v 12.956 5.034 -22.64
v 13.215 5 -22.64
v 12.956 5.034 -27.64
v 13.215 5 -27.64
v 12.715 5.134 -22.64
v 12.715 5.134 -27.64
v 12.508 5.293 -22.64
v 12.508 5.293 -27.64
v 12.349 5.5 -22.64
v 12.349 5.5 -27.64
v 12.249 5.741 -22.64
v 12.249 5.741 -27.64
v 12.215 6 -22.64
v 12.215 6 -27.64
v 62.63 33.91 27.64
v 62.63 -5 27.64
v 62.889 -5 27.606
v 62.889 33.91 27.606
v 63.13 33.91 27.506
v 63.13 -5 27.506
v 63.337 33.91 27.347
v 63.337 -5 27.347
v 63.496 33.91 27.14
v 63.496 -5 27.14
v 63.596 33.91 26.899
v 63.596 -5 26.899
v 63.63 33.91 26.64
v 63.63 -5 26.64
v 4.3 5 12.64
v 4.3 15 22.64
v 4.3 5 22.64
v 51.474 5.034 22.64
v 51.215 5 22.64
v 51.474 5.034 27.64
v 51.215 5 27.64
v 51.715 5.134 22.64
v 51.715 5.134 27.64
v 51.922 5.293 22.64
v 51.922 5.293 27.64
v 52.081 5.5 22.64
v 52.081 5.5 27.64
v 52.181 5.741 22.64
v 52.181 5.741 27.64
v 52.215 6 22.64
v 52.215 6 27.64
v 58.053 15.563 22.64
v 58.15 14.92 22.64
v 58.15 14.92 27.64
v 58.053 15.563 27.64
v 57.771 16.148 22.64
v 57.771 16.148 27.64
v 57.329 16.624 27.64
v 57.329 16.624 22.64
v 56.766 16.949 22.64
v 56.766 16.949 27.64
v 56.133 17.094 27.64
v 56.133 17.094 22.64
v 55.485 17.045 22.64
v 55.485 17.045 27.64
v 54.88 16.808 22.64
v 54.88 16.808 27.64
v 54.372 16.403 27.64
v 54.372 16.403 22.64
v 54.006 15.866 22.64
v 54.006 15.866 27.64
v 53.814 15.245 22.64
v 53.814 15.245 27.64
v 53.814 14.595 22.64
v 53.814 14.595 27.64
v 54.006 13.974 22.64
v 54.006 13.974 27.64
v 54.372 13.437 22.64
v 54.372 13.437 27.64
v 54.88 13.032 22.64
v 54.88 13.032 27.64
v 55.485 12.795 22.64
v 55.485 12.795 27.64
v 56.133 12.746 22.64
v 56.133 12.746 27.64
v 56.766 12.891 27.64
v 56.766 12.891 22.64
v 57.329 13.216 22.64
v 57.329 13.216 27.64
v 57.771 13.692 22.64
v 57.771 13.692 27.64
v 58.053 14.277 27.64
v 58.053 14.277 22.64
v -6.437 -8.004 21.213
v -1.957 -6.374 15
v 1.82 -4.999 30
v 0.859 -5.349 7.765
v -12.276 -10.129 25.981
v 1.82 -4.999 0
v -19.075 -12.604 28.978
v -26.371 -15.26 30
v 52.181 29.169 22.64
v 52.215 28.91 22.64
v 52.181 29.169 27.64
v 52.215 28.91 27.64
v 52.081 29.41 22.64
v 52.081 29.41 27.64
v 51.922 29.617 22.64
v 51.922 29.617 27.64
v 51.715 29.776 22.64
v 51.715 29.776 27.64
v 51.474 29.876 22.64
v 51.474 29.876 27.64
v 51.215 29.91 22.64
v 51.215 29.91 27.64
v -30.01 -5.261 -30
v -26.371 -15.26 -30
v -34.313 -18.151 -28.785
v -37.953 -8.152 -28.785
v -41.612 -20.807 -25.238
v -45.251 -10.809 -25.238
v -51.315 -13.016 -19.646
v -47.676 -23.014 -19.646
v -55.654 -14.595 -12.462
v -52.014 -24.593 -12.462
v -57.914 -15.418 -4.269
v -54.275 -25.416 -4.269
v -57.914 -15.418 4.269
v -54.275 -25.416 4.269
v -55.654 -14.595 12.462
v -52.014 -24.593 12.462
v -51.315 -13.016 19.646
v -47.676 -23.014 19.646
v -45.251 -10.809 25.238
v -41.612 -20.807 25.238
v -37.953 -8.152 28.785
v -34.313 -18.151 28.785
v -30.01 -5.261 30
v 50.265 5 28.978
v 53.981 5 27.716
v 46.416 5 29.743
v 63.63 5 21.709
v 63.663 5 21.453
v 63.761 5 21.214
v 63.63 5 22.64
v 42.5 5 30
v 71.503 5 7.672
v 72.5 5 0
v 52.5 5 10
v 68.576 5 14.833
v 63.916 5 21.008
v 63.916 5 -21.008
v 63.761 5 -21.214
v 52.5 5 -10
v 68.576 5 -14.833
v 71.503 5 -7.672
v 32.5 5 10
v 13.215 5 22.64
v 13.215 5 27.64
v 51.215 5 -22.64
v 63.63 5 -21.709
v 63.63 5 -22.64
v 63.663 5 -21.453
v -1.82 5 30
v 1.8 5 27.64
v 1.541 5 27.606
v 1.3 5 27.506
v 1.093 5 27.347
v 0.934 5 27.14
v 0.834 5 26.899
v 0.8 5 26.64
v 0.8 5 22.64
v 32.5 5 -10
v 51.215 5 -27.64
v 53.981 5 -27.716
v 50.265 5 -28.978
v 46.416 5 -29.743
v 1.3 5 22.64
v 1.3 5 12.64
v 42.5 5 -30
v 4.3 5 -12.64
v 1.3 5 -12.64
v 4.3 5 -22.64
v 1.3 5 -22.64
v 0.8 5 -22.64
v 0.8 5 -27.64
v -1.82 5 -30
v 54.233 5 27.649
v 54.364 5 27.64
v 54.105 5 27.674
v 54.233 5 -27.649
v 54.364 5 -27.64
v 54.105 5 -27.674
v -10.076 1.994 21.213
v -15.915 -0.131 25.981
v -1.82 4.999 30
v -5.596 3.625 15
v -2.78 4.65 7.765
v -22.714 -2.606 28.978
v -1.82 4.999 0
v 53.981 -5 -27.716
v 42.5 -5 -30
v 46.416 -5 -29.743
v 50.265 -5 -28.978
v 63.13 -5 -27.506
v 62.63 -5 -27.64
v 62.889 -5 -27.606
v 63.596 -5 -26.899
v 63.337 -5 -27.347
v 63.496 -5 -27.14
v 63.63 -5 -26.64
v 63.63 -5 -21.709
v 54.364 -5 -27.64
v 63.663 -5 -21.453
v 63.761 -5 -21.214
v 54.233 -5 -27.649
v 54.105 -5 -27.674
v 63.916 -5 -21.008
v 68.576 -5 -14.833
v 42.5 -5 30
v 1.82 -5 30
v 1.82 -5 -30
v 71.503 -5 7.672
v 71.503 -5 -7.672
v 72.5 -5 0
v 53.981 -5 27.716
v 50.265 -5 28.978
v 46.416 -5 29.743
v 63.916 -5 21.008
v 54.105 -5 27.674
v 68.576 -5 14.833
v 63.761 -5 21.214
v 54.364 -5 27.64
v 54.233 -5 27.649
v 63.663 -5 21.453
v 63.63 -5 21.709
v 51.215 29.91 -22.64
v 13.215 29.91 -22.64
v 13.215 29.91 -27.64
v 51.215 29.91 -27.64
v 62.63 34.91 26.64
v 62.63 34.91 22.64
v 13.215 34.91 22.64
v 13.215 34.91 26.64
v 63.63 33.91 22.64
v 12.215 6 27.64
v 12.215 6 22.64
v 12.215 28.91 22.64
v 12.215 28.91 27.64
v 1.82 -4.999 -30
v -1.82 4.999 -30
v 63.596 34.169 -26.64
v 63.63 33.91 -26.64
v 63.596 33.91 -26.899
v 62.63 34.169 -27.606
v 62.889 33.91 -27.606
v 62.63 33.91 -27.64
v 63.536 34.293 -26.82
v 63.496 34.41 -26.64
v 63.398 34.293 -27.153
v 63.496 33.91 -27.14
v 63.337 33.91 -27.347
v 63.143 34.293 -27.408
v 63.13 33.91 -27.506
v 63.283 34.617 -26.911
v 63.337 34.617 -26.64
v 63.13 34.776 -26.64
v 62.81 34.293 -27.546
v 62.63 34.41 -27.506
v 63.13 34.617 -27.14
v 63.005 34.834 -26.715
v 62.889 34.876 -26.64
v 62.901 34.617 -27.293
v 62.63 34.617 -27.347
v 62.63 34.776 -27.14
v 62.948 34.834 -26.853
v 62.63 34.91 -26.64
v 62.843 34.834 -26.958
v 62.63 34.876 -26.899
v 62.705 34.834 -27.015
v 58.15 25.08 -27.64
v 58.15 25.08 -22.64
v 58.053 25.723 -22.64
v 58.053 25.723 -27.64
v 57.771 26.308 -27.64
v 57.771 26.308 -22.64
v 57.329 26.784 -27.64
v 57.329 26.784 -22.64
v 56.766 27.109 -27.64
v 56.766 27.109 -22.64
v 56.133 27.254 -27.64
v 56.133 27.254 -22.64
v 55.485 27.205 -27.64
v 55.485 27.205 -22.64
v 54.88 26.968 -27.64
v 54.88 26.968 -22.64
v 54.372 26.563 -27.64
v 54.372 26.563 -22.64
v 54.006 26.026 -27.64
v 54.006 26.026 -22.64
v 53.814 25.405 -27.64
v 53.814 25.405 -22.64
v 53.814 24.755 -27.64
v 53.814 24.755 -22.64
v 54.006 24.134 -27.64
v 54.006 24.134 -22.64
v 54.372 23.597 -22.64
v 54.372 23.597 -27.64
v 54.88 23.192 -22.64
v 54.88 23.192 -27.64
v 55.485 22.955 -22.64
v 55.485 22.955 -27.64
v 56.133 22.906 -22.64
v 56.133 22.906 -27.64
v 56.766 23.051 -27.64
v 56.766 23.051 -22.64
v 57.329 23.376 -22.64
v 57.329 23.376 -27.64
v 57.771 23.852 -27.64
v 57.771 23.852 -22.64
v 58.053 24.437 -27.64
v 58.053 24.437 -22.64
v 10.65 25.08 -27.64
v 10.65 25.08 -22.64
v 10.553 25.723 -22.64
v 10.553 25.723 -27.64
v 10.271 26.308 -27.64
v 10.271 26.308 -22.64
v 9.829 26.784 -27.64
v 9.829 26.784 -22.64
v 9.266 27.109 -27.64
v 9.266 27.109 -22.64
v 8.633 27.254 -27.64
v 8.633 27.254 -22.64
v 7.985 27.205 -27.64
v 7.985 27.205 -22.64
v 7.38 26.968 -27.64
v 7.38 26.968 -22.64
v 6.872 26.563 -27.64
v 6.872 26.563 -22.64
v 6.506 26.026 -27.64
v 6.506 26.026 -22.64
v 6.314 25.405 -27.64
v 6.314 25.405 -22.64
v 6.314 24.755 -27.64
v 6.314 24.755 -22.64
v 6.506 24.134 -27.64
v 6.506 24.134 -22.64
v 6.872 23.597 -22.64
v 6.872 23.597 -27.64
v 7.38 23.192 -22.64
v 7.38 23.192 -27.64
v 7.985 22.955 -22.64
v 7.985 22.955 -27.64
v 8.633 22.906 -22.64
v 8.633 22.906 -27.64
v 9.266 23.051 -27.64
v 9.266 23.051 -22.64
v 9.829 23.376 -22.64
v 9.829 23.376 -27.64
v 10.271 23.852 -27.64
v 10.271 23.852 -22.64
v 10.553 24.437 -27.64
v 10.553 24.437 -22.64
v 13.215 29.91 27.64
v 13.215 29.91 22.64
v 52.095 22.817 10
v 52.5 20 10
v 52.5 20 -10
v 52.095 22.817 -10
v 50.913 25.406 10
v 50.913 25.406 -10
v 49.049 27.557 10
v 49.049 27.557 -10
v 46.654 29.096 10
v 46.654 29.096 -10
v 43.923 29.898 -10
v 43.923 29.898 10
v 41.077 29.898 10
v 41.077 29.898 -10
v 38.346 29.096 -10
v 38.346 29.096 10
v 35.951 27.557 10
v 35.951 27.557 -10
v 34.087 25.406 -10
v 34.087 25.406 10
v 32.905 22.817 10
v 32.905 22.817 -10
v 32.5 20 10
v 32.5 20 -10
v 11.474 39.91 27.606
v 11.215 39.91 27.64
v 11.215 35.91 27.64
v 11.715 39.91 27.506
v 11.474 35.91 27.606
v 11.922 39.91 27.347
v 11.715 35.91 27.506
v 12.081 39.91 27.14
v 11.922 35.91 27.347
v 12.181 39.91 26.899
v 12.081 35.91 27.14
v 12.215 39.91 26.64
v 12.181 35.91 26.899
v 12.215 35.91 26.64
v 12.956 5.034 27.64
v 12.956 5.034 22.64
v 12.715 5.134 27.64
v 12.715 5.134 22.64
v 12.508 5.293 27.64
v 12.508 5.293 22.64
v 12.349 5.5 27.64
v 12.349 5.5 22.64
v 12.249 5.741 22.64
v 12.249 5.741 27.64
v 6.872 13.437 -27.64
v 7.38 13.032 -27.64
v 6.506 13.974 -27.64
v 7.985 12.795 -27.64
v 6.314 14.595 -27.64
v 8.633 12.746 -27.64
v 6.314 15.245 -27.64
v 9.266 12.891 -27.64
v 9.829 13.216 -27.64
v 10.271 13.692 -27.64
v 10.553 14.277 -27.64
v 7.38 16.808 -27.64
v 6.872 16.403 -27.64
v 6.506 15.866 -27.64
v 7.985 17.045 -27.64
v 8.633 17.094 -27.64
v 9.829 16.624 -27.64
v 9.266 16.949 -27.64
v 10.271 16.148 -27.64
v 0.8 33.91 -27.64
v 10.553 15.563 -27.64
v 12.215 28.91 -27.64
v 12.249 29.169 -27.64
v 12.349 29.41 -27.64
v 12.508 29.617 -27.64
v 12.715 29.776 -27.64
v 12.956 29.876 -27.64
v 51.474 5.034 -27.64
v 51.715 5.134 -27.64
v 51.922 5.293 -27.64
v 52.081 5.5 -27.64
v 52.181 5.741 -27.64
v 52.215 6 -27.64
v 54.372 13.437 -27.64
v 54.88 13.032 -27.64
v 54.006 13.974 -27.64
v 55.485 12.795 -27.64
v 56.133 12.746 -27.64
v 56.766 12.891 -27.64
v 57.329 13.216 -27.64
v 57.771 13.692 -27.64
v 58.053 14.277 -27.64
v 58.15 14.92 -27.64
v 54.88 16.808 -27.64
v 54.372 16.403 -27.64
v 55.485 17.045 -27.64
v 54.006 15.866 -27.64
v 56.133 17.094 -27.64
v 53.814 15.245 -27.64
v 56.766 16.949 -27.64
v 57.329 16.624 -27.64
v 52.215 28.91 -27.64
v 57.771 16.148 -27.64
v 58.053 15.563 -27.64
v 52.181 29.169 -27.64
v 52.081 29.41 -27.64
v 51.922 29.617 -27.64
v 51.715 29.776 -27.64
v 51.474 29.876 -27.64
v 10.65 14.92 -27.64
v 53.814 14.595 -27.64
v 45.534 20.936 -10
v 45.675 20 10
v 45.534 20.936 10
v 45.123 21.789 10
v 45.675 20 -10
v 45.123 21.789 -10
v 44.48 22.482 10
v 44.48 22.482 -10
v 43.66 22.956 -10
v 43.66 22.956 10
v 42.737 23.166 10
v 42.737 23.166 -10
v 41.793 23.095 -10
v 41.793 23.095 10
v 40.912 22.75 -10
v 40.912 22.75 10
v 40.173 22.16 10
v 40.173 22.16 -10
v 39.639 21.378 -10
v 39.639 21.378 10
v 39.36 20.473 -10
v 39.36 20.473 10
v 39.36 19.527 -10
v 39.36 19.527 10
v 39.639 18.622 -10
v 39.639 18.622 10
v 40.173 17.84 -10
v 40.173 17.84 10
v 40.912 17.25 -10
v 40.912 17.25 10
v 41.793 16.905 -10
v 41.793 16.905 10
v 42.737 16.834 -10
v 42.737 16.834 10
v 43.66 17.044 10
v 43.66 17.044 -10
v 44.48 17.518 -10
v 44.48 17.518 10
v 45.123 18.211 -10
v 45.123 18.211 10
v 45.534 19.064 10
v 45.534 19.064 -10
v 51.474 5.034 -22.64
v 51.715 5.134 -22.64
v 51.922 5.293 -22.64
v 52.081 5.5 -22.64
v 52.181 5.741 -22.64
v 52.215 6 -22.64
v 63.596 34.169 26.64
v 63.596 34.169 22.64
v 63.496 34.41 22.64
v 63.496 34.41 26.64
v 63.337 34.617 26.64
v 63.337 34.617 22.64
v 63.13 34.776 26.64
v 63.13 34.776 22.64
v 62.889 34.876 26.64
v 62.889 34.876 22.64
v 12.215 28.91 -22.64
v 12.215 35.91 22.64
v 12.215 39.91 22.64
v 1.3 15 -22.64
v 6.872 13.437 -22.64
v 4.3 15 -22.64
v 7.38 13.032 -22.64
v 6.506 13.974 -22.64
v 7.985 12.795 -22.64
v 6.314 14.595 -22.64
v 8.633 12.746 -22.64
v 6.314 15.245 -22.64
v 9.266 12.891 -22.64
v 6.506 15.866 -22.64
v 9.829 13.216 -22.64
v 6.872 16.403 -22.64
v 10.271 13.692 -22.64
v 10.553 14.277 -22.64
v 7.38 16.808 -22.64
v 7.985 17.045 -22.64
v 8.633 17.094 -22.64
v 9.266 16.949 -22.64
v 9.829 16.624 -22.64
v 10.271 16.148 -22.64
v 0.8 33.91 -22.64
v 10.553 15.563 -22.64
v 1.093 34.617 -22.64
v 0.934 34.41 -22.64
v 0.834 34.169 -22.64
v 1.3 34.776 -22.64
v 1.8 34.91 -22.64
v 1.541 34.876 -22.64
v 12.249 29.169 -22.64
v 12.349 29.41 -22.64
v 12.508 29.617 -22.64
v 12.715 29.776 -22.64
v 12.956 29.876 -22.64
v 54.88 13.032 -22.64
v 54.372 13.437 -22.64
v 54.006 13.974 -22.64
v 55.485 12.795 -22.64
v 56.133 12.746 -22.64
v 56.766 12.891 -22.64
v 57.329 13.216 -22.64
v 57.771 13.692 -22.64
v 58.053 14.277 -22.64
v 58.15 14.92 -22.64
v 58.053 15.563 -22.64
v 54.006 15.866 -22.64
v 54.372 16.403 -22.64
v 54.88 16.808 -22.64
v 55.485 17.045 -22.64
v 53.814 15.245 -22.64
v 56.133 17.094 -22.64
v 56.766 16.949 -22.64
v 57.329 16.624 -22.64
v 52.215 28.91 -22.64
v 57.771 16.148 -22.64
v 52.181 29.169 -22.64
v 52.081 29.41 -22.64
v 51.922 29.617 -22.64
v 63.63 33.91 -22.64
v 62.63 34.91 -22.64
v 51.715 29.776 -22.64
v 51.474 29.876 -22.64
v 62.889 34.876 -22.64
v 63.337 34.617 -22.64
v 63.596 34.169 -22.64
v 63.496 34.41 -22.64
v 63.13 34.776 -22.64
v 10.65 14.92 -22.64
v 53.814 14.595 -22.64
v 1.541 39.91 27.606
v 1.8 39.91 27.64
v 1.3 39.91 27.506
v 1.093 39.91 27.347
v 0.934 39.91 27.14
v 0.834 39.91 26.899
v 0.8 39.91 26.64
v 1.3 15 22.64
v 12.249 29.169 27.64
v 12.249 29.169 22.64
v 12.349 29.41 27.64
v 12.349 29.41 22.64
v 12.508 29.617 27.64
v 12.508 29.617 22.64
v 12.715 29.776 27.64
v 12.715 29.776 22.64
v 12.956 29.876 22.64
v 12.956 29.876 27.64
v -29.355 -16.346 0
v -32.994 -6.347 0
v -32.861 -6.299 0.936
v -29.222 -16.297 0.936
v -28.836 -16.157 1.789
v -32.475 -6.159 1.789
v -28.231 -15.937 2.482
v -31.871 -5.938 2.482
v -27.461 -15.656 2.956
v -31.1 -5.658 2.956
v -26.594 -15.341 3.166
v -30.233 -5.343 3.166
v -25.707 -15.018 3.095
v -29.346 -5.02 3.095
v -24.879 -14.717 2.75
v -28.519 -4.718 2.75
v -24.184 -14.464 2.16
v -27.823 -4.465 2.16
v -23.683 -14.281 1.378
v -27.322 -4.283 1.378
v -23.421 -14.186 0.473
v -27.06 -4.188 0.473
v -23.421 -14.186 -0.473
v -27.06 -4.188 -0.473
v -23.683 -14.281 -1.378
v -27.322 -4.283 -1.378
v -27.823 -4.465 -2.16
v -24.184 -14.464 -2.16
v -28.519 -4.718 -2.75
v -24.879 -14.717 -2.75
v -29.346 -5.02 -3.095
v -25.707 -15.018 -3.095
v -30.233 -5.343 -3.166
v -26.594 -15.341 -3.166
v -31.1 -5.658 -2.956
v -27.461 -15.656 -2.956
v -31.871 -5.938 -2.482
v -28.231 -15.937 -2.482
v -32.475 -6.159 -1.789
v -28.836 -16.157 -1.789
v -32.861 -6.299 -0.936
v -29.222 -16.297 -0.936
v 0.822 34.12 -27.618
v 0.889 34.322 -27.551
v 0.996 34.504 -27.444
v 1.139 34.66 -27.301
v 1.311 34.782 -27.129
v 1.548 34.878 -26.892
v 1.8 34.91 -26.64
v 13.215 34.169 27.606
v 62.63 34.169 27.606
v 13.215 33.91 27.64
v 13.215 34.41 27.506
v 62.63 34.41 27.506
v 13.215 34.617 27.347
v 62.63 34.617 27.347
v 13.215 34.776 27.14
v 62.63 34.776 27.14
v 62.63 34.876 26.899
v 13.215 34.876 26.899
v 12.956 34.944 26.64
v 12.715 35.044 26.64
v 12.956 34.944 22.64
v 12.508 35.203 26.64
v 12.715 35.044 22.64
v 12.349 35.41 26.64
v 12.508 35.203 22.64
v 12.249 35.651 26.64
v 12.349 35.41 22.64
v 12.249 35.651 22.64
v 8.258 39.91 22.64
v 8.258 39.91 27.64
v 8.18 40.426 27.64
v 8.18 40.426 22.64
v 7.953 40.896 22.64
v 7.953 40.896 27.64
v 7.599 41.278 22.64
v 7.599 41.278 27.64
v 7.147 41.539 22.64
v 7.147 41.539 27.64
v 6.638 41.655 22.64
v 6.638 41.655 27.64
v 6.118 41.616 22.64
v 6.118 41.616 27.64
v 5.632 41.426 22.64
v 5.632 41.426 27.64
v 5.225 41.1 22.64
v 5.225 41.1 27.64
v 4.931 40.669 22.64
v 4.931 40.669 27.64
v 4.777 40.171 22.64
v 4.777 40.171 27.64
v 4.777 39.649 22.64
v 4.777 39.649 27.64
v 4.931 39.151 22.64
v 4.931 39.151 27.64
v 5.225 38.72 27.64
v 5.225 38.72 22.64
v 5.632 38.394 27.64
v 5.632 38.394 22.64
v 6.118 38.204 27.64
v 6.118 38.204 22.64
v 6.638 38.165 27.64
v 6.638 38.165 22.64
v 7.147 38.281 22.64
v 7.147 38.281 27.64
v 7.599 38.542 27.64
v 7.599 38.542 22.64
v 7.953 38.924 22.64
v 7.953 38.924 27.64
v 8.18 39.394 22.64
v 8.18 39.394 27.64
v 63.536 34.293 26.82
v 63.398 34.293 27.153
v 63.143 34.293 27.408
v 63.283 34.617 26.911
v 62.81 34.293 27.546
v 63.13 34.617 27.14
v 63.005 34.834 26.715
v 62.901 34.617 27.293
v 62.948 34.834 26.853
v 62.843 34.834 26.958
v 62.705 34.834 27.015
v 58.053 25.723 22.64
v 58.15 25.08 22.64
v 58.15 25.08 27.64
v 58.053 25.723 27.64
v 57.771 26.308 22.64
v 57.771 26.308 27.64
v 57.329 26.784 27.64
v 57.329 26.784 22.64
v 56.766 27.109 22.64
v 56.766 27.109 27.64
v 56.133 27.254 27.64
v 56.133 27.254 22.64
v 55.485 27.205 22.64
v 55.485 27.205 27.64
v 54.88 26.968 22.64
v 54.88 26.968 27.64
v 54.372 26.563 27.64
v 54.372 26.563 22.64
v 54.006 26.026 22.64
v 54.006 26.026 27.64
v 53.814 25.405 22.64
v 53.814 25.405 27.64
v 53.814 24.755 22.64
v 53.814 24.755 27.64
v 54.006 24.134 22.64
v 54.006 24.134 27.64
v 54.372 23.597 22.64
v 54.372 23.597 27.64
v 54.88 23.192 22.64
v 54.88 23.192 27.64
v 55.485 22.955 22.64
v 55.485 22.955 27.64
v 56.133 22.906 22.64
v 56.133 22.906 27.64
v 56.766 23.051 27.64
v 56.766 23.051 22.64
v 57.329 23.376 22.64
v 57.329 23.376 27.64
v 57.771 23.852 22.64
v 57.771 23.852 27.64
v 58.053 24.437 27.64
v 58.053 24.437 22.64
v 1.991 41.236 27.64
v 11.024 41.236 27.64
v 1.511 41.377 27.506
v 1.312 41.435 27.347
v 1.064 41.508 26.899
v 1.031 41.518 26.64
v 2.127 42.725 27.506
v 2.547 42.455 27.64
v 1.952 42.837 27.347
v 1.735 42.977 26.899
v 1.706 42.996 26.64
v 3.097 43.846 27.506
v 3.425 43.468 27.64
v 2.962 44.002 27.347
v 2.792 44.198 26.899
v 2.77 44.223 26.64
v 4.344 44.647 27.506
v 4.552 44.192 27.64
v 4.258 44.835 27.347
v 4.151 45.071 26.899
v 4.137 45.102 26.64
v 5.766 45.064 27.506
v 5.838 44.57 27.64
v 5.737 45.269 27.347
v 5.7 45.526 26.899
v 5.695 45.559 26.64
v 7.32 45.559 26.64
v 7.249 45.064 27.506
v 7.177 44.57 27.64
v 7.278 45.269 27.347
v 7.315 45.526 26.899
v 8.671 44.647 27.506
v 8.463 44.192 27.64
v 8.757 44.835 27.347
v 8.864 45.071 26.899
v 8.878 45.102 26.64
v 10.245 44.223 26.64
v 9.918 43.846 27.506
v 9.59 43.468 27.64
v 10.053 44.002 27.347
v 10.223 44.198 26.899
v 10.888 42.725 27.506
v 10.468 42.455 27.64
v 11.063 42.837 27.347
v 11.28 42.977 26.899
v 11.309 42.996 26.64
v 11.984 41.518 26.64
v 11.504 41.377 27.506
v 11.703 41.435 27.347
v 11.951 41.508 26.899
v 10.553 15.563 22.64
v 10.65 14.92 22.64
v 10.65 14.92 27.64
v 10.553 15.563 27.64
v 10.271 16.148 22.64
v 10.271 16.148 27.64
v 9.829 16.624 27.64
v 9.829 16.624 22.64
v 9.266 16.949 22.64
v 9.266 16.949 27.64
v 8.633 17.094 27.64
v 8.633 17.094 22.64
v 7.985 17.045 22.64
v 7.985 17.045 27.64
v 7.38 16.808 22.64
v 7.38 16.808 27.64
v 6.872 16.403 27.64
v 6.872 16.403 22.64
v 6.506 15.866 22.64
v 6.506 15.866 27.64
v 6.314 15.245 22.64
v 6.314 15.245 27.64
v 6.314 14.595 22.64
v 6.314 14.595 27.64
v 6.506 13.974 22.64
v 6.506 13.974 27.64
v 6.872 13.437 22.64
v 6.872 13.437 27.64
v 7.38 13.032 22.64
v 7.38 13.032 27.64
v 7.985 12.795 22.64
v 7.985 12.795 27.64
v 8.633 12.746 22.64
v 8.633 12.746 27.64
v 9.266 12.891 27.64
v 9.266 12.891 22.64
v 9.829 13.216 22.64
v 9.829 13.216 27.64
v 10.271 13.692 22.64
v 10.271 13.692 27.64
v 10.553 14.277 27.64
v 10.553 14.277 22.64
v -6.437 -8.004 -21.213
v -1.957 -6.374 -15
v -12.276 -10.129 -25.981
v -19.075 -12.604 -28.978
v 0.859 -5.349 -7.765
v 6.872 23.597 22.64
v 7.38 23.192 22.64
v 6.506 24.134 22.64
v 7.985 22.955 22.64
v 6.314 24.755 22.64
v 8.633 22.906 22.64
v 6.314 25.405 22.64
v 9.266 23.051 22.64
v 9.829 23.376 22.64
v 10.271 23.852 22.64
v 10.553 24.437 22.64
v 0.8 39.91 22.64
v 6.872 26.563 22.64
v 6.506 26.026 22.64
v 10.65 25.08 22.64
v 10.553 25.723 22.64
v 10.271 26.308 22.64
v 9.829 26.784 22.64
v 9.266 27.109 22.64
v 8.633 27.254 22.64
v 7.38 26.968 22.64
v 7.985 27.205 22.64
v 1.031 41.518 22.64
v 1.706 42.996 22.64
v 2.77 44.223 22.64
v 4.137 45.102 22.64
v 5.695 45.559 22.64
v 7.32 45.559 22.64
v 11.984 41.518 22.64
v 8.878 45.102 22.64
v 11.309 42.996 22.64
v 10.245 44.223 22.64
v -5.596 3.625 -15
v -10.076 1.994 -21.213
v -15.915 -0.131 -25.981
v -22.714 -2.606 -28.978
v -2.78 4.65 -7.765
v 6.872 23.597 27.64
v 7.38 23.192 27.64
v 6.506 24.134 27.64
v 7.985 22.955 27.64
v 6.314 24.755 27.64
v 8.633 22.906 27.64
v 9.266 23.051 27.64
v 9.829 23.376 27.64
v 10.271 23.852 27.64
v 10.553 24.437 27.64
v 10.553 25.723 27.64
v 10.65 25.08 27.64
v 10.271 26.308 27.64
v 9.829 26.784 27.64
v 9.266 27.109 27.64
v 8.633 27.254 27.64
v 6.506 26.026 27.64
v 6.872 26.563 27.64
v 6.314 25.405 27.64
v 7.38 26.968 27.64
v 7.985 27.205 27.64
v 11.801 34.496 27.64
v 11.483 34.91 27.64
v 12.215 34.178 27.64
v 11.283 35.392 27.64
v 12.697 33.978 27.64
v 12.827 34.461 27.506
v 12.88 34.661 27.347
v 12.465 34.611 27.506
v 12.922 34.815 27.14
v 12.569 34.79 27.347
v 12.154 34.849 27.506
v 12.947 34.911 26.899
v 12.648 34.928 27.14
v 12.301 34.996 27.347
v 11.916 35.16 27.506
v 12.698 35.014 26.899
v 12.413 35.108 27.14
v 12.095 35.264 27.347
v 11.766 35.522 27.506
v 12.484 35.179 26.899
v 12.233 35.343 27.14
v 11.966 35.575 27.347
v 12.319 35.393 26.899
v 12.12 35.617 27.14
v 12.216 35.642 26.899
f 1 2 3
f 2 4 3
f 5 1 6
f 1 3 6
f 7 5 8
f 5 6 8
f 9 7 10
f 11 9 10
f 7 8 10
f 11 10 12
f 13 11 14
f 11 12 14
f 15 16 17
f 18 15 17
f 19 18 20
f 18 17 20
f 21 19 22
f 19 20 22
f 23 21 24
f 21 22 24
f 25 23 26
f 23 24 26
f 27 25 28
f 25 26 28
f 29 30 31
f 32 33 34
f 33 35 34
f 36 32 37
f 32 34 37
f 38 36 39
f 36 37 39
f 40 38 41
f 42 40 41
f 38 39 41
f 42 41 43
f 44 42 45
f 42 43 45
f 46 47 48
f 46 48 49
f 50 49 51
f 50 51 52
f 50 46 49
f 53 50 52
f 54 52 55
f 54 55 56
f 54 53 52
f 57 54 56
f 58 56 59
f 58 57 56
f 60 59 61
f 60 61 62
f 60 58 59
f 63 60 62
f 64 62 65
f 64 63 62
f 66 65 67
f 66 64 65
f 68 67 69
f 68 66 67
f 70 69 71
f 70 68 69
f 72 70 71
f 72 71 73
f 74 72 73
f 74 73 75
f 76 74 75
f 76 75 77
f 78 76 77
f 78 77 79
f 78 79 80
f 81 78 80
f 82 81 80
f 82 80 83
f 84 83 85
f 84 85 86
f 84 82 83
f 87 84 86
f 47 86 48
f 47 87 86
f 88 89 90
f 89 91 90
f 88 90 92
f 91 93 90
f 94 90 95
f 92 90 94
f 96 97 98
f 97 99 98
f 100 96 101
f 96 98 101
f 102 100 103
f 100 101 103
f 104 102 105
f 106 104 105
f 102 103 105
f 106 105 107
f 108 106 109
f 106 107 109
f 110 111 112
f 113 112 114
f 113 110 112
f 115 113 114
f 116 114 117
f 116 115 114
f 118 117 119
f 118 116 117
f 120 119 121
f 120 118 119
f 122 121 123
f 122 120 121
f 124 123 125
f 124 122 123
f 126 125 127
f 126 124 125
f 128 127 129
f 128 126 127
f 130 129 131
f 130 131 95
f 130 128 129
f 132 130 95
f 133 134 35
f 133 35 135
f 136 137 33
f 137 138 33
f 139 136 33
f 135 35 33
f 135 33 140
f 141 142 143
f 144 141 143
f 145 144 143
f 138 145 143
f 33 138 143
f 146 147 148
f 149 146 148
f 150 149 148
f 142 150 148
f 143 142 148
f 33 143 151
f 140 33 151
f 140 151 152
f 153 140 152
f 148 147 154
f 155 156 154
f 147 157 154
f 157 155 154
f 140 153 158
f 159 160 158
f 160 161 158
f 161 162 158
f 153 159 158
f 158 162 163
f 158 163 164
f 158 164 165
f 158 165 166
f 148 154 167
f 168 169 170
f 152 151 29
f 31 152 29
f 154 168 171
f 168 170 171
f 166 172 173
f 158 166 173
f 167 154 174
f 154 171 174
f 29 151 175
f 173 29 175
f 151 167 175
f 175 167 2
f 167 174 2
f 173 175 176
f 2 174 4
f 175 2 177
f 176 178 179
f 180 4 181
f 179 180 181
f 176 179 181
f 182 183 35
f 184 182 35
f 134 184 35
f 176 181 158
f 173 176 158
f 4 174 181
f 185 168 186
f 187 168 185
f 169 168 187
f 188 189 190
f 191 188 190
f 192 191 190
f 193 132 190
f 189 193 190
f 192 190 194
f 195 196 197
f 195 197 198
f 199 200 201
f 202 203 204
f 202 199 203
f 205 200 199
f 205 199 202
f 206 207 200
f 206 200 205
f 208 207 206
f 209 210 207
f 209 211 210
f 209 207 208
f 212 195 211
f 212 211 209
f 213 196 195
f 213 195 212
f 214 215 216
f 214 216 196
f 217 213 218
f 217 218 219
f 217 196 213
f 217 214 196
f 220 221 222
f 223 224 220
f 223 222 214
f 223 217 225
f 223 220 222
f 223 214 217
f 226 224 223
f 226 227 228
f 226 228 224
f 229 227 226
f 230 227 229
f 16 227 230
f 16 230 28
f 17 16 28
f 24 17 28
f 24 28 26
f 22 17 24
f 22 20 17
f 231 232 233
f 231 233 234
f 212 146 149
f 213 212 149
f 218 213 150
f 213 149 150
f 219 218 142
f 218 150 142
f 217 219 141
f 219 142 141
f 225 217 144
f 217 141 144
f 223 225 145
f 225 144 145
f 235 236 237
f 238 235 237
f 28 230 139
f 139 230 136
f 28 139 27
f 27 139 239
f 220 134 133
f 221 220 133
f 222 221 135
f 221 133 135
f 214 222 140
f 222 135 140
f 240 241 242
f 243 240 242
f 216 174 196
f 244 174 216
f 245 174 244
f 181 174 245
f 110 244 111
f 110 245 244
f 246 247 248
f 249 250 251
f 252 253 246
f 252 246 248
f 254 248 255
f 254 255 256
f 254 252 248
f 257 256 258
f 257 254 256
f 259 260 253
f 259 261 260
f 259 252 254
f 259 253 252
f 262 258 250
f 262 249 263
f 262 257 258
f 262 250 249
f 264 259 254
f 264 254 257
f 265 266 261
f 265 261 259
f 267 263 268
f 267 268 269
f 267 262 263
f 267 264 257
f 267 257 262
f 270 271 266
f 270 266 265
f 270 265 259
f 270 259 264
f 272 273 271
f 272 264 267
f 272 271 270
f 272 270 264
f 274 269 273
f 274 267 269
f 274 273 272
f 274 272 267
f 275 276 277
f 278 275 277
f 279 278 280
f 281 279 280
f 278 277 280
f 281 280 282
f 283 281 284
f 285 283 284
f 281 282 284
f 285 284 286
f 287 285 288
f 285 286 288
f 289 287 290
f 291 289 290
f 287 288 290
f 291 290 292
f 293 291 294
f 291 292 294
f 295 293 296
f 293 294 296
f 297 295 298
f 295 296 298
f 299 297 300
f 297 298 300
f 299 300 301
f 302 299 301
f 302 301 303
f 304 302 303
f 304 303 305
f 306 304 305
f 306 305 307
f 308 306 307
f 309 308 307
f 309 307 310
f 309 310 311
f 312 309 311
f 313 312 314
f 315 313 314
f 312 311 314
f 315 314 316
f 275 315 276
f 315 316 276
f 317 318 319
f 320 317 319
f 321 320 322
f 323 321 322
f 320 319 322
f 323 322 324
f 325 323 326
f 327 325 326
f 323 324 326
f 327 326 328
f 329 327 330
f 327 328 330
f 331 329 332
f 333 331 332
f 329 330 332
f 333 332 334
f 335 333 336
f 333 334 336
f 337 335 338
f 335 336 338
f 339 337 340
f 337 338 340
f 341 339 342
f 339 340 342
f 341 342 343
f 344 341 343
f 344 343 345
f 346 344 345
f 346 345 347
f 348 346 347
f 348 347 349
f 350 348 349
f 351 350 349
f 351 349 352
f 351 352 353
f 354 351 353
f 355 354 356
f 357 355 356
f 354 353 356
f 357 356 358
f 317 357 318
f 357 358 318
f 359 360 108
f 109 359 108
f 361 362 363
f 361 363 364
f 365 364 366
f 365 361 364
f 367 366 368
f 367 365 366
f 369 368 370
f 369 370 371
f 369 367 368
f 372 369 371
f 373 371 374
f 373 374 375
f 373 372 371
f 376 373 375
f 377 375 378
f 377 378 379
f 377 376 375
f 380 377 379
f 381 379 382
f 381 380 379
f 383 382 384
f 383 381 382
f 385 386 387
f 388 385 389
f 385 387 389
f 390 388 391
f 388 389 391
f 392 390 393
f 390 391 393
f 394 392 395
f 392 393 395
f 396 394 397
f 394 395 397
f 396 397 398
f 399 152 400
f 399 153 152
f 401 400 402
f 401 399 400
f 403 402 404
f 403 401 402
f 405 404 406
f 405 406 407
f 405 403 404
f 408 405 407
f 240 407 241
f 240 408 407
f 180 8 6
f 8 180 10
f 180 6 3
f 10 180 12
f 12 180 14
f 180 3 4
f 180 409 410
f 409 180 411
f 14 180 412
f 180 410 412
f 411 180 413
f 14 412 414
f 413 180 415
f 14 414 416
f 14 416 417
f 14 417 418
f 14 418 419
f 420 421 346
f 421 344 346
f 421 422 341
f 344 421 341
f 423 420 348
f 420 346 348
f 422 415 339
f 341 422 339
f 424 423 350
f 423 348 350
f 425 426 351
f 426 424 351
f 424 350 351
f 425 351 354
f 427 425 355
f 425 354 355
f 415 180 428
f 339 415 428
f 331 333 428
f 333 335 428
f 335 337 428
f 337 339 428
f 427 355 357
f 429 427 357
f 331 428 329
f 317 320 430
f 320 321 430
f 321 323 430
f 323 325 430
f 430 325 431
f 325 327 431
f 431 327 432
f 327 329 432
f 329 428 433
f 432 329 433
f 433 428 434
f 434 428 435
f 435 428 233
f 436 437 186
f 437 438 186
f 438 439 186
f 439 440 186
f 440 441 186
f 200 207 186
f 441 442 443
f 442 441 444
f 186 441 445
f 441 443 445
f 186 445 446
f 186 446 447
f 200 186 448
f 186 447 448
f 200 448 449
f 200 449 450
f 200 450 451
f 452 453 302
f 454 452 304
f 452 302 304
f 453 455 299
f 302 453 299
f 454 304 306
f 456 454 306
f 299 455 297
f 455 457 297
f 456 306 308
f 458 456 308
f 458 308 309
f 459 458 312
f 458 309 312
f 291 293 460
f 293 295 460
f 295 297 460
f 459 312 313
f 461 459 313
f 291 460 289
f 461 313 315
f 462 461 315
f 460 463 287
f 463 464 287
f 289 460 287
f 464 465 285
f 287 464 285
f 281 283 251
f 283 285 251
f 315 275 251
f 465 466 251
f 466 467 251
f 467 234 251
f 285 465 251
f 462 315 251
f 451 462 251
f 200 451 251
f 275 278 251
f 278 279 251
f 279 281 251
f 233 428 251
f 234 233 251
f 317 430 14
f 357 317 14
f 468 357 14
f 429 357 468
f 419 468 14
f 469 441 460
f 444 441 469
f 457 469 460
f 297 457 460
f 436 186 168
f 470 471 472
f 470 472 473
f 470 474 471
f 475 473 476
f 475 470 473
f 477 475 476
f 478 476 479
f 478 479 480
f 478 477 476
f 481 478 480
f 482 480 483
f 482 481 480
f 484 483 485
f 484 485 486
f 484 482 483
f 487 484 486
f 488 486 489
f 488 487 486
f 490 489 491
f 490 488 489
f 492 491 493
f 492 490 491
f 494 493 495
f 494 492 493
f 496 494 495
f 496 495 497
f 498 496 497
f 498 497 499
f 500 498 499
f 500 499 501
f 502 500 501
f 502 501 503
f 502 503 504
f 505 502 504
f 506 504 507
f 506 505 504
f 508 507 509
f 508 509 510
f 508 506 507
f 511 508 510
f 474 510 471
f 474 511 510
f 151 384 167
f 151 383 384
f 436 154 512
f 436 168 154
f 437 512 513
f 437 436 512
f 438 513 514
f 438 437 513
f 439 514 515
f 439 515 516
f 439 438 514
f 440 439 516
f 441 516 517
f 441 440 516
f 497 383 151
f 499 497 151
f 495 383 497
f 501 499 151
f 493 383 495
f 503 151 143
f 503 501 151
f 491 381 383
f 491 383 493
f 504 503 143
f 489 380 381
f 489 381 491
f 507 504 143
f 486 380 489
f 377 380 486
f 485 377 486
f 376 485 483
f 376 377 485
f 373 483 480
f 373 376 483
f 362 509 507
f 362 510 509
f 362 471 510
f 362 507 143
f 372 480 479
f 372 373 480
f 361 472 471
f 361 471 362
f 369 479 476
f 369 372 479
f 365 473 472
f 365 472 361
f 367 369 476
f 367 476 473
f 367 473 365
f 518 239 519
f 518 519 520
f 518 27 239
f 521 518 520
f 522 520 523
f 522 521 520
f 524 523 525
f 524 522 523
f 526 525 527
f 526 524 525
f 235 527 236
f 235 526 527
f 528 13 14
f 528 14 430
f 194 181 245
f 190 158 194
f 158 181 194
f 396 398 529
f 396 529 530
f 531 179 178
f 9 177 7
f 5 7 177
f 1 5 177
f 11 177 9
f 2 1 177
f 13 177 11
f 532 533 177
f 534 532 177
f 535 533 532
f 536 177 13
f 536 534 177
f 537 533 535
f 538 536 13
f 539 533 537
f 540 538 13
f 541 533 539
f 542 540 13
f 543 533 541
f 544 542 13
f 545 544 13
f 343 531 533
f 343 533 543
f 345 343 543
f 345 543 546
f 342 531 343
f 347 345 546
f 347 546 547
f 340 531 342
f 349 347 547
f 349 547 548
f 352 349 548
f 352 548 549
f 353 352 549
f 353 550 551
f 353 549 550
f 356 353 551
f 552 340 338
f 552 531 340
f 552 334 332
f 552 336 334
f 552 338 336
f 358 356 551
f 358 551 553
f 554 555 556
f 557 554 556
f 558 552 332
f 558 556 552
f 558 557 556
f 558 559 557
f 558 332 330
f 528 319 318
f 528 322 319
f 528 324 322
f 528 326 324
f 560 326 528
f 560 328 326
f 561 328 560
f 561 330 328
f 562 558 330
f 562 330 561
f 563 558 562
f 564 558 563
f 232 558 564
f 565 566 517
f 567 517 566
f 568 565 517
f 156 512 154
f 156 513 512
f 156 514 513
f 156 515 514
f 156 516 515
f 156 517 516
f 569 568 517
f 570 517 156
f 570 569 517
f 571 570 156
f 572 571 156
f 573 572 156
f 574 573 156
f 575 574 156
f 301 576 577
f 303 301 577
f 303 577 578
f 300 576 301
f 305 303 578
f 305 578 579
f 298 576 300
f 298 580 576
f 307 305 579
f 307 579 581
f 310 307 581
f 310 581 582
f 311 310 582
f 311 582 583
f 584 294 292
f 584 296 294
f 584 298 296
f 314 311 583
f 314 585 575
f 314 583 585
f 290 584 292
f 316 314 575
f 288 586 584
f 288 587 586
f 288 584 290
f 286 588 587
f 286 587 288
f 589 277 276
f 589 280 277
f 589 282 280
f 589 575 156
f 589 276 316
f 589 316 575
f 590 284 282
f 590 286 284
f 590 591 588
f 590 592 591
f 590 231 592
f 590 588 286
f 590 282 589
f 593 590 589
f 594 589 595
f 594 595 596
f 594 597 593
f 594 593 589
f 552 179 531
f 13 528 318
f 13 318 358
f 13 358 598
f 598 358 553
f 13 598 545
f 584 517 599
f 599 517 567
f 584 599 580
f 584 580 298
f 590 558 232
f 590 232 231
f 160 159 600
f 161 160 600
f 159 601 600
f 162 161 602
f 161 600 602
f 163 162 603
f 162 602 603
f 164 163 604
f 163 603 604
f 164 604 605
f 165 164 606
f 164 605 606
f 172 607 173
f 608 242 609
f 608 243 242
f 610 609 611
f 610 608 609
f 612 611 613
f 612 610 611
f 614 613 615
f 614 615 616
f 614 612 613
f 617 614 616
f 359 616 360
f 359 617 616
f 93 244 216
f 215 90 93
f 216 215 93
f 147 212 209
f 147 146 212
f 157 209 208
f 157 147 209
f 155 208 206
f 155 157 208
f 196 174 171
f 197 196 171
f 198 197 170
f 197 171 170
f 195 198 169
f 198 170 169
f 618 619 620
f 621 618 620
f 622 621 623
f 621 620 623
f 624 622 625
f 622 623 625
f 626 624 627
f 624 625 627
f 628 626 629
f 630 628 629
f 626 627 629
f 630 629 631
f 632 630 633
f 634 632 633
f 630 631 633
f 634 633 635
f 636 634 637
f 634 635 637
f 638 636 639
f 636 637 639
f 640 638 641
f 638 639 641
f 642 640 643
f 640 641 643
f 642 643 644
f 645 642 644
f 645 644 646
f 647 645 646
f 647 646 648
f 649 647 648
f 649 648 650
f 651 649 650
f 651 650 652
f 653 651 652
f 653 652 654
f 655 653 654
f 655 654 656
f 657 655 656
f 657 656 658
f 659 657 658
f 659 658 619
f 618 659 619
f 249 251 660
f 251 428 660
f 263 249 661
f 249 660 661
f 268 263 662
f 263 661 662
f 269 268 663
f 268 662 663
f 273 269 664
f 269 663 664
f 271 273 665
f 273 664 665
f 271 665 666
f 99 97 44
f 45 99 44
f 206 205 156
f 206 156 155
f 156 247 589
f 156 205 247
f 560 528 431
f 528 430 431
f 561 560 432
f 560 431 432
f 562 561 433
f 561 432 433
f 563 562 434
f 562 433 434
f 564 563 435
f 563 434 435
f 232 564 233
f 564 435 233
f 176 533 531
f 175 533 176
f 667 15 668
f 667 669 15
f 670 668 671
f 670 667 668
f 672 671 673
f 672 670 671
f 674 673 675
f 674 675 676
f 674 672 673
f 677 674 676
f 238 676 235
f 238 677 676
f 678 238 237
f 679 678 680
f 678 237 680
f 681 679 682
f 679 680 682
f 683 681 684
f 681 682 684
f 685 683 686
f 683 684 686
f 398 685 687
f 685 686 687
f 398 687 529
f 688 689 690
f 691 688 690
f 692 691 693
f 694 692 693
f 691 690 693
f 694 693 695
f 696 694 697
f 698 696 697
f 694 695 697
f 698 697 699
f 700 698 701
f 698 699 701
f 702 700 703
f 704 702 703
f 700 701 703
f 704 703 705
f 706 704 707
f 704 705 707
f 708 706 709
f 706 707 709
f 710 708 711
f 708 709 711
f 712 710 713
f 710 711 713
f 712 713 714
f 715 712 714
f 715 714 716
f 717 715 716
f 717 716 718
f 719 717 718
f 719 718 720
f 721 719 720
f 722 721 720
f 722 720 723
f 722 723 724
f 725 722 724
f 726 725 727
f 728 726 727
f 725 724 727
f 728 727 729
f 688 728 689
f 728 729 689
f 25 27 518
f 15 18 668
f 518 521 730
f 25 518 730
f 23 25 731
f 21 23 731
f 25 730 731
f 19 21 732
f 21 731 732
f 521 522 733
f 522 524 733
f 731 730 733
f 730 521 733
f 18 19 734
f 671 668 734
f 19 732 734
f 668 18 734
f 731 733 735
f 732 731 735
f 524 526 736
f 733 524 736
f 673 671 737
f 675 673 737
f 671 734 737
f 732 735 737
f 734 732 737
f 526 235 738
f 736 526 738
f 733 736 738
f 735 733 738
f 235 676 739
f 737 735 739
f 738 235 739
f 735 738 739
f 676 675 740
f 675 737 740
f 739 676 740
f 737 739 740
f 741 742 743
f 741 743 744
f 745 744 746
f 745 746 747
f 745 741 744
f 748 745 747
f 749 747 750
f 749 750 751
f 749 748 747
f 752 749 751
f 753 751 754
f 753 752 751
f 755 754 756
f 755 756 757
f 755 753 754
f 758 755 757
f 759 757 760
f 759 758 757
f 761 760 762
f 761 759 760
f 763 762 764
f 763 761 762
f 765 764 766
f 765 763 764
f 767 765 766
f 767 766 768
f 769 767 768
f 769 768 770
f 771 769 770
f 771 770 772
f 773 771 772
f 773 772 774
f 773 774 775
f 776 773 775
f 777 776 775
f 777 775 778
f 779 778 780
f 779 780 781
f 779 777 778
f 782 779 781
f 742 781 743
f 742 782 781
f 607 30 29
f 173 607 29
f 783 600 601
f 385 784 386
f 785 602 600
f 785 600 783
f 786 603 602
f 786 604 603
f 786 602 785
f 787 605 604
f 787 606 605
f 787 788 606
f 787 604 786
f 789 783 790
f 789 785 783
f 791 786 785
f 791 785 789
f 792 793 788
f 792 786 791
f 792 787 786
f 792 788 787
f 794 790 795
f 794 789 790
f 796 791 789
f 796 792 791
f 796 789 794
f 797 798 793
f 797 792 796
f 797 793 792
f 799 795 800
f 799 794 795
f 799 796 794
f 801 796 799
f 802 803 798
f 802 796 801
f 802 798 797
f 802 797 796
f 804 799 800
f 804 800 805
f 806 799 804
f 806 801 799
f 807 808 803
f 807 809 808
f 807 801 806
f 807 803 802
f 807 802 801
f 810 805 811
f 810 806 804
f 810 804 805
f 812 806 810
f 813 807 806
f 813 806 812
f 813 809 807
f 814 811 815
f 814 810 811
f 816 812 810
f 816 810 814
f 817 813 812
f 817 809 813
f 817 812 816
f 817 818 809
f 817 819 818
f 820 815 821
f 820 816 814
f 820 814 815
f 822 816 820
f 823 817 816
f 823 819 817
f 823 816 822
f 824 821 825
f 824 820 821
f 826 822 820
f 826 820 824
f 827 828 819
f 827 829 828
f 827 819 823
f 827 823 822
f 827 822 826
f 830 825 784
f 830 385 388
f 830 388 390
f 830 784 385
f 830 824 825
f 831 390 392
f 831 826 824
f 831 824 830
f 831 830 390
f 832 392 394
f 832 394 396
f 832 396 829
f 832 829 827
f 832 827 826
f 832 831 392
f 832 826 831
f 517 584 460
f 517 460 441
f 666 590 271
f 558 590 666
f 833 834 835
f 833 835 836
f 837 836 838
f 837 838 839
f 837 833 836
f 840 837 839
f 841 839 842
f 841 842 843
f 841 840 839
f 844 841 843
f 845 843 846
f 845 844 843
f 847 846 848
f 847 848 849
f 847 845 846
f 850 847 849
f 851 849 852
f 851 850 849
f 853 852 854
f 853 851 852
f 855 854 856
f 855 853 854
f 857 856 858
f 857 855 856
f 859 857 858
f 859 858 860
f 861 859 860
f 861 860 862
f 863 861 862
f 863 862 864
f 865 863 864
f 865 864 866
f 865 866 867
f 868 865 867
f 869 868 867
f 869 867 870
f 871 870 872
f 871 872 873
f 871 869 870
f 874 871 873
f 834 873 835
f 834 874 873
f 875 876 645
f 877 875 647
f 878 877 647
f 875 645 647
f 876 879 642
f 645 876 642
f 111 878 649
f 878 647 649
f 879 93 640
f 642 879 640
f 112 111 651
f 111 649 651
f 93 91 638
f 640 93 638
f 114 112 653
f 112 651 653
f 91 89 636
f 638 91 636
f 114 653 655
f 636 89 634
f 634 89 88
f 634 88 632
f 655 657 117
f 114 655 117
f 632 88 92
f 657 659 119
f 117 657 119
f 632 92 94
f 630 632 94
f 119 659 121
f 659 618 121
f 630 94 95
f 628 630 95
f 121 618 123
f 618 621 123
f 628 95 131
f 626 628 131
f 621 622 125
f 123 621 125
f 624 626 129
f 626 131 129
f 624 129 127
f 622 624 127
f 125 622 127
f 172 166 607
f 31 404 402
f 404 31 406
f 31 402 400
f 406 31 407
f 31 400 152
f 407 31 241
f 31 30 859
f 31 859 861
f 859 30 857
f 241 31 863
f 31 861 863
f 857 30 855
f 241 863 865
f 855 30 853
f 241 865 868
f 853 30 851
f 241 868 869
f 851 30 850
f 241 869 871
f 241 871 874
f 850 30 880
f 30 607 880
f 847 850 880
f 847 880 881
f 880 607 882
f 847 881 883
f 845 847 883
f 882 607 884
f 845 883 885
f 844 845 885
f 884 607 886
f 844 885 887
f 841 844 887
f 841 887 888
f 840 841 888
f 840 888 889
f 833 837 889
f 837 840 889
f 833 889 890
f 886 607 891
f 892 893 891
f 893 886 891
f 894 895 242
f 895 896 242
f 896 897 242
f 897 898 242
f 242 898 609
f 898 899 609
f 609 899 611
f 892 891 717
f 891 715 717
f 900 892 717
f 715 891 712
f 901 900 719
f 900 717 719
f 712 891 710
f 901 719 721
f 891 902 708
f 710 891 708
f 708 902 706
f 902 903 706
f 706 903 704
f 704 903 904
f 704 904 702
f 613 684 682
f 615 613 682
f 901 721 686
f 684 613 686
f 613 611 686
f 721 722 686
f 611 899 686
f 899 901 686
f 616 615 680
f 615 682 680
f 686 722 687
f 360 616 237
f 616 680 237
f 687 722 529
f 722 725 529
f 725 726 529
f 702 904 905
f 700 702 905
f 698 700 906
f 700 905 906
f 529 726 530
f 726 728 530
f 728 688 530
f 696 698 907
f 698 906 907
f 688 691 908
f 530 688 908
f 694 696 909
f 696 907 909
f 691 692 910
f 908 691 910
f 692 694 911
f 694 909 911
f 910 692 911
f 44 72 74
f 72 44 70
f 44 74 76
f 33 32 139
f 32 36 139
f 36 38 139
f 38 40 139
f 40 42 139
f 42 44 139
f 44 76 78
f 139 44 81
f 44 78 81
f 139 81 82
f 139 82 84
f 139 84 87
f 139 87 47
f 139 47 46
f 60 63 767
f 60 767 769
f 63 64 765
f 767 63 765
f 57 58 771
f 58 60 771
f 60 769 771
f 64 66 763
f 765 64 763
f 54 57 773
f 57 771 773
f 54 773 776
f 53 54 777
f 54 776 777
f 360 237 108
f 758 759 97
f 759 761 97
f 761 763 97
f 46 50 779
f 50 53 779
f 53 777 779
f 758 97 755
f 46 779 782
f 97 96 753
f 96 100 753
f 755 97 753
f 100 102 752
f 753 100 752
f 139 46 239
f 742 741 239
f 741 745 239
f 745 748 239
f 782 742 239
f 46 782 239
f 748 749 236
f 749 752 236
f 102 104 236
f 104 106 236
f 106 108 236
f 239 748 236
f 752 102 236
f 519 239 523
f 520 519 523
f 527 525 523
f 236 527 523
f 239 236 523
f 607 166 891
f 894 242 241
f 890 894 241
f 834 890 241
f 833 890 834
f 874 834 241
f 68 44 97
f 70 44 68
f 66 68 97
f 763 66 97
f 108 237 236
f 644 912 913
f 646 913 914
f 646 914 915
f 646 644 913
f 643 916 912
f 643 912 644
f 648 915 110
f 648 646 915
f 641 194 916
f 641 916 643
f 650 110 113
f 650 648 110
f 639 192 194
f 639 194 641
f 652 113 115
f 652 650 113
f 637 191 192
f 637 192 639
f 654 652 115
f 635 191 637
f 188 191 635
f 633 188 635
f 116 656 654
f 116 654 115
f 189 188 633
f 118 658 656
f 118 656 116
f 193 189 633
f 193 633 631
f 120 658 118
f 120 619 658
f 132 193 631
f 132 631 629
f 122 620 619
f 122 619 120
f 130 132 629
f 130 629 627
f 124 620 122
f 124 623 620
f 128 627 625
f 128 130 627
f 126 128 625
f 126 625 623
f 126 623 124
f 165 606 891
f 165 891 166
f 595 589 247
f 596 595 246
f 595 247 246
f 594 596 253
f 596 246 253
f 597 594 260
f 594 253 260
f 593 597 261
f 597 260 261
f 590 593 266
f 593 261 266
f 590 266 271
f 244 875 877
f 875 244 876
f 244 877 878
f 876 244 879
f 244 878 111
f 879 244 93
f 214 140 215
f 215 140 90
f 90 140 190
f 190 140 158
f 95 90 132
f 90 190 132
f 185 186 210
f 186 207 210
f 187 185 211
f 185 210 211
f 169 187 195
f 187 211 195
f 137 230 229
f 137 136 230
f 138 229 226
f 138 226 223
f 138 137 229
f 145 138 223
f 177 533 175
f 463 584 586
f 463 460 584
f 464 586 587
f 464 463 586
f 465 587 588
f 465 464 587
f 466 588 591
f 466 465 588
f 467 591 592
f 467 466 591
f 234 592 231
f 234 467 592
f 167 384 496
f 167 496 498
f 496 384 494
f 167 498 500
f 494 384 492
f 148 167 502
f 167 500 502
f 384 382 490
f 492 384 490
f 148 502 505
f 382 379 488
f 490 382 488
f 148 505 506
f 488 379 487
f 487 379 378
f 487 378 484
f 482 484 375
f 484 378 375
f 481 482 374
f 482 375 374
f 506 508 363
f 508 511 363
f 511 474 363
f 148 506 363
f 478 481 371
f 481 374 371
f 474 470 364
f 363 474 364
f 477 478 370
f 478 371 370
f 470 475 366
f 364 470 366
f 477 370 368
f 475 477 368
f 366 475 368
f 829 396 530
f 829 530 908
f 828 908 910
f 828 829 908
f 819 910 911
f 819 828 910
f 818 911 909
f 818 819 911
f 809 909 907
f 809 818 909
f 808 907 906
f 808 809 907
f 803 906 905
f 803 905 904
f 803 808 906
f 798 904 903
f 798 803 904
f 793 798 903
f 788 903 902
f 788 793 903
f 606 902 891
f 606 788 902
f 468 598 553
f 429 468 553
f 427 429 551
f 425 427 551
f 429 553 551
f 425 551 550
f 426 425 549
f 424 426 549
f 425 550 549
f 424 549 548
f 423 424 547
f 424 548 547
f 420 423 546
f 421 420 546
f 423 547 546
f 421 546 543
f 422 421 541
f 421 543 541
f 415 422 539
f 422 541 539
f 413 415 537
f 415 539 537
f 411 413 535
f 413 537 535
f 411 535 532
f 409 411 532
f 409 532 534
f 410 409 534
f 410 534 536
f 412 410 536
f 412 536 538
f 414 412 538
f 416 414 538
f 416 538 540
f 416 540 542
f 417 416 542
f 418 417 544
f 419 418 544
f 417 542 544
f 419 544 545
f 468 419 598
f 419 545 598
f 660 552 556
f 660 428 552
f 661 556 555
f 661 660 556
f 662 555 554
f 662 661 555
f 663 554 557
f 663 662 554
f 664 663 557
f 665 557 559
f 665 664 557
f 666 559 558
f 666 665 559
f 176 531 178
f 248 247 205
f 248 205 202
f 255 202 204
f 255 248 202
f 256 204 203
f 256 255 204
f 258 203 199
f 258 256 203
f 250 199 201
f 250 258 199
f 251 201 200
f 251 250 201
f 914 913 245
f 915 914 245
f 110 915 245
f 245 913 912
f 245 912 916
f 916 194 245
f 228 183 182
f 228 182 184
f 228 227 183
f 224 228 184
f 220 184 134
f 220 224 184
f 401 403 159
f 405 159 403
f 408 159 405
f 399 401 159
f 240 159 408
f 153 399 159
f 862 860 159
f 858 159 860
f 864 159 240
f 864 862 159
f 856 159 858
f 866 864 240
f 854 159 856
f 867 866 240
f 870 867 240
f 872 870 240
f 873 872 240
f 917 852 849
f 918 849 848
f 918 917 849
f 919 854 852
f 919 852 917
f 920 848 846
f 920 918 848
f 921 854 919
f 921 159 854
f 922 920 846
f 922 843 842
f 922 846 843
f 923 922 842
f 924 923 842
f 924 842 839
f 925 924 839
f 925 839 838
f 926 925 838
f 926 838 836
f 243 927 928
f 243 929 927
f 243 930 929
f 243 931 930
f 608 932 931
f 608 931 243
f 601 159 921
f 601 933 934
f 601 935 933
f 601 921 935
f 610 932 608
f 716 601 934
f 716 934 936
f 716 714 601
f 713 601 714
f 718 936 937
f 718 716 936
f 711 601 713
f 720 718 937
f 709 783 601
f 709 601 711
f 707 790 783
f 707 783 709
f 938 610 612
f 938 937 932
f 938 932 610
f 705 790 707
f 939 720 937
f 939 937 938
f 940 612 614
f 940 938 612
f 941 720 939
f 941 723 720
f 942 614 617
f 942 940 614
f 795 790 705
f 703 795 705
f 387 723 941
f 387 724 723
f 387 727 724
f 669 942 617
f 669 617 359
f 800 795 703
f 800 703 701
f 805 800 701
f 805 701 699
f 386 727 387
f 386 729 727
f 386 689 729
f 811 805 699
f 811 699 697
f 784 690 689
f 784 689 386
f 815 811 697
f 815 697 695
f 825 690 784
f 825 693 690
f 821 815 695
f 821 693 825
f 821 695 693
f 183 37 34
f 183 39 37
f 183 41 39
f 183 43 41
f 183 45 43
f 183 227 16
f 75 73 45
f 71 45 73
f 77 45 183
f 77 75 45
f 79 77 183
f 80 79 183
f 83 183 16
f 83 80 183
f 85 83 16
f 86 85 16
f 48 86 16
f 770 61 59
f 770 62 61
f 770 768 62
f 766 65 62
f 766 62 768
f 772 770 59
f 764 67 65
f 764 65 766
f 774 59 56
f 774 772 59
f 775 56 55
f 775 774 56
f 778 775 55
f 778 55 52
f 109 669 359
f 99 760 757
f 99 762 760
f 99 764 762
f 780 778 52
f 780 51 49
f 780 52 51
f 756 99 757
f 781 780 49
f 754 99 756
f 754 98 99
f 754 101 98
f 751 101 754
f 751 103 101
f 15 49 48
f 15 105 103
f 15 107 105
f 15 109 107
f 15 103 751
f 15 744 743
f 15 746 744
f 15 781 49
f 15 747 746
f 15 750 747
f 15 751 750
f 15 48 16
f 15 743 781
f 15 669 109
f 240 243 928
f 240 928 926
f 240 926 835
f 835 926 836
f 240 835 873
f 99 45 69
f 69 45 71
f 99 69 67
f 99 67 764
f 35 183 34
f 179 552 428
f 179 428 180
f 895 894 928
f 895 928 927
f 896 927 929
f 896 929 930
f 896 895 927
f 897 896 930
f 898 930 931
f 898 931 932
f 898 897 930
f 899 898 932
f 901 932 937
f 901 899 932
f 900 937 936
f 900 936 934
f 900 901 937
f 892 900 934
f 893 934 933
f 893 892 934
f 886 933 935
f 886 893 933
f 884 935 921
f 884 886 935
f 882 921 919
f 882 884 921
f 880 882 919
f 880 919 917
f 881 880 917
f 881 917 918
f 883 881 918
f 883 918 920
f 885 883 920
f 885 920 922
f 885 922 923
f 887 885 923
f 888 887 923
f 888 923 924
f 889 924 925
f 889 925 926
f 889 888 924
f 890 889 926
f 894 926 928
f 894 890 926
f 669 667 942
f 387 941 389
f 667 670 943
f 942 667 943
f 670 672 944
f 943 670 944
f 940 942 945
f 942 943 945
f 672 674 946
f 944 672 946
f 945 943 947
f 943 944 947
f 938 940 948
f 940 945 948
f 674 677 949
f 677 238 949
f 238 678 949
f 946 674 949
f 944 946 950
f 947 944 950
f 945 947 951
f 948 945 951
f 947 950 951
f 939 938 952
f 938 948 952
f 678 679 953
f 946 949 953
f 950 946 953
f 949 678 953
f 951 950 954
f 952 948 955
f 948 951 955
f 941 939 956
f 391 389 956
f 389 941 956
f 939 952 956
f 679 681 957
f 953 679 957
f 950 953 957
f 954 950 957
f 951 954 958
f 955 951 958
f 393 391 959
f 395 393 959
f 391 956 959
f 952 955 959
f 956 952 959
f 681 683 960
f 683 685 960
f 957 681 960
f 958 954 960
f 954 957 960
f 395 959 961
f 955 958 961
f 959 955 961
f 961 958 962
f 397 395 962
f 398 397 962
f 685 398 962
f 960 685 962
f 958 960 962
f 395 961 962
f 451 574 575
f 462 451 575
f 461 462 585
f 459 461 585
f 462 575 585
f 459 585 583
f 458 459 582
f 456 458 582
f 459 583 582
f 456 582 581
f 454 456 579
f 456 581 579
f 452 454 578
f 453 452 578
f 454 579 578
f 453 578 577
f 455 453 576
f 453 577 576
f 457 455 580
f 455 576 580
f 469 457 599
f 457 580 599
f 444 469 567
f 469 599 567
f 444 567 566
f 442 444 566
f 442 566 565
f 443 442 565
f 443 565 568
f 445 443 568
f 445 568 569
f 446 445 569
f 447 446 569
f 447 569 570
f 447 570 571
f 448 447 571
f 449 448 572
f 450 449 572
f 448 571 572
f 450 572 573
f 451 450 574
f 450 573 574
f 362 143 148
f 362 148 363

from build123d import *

# Parameters (mm, degrees)
BOSS_EXTRU_3_DEPTH      = 5
ESQUISSE7_R             = 3.175
BOSS_EXTRU_5_DEPTH      = 10
ESQUISSE13_R            = 2.18
BOSS_EXTRU_8_DEPTH      = 5
ESQUISSE33_W            = 9.466792894
ESQUISSE33_H            = 55.28
BOSS_EXTRU_10_DEPTH     = 10
ENL_V_MAT_EXTRU_6_DEPTH = 65
ESQUISSE35_R            = 30
BOSS_EXTRU_11_DEPTH     = 5.32
BOSS_EXTRU_12_DEPTH     = 30
ESQUISSE41_R            = 3.175
ENL_V_MAT_EXTRU_7_DEPTH = 60
ESQUISSE42_R            = 1.75
BOSS_EXTRU_13_DEPTH     = 5
NERVURE4_REACH          = 90.538
ESQUISSE45_WALL_W       = 193.218913386
ESQUISSE45_WALL_H       = 3
CONG_1_R                = 1
CONG_2_R                = 1


with BuildPart() as part:
    # Esquisse5 → Boss.-Extru.3 (new, symmetric)
    with BuildSketch(Plane(origin=(0, 0, 0), x_dir=(1, 0, 0), z_dir=(0, 1, 0))):
        with BuildLine():
            Line((42.5, -30), (-42.5, -30))
            ThreePointArc((-42.5, -30), (-72.5, 0), (-42.5, 30))
            Line((-42.5, 30), (42.5, 30))
            ThreePointArc((42.5, 30), (72.5, 0), (42.5, -30))
        make_face()
    extrude(amount=BOSS_EXTRU_3_DEPTH, both=True)

    # Esquisse7 → Boss.-Extru.5 (add, symmetric)
    with BuildSketch(Plane.XY):
        with BuildLine():
            Line((32.5, 5), (52.5, 5))
            Line((52.5, 5), (52.5, 20))
            ThreePointArc((52.5, 20), (42.5, 30), (32.5, 20))
            Line((32.5, 20), (32.5, 5))
        make_face()
        with Locations((42.5, 20)):
            Circle(ESQUISSE7_R, mode=Mode.SUBTRACT)
    extrude(amount=BOSS_EXTRU_5_DEPTH, both=True)

    # Esquisse13 → Boss.-Extru.8 (add)
    with BuildSketch(Plane.XY.offset(22.64)):
        Polygon((0.8, 5), (5.8, 5), (12.215, 5), (12.215, 29.91), (52.215, 29.91), (52.215, 5), (58.63, 5), (63.63, 5), (63.63, 34.91), (0.8, 34.91), align=None)
        with Locations((8.47, 14.92)):
            Circle(ESQUISSE13_R, mode=Mode.SUBTRACT)
        with Locations((55.97, 14.92)):
            Circle(ESQUISSE13_R, mode=Mode.SUBTRACT)
        with Locations((8.47, 25.08)):
            Circle(ESQUISSE13_R, mode=Mode.SUBTRACT)
        with Locations((55.97, 25.08)):
            Circle(ESQUISSE13_R, mode=Mode.SUBTRACT)
    boss_extru_8 = extrude(amount=BOSS_EXTRU_8_DEPTH)

    # Symétrie2: Boss.-Extru.8 across plane
    add(boss_extru_8.mirror(Plane.XY))

    # Esquisse33 → Boss.-Extru.10 (add)
    with BuildSketch(Plane.XZ.offset(-5)):
        with Locations((58.896603553, 0)):
            Rectangle(ESQUISSE33_W, ESQUISSE33_H)
    extrude(amount=BOSS_EXTRU_10_DEPTH)

    # Esquisse36 → Enlèv. mat.-Extru.6 (cut, symmetric)
    with BuildSketch(Plane.XY):
        Polygon((0, 0), (9.099255857, -25), (-112.5, -25), (-112.5, 35), (-12.738958199, 35), align=None)
    extrude(amount=ENL_V_MAT_EXTRU_6_DEPTH, both=True, mode=Mode.SUBTRACT)



with BuildPart() as body_2:
    # Esquisse35 → Boss.-Extru.11 (new, symmetric)
    with BuildSketch(Plane(origin=(0, 0, 0), x_dir=(0, 0, -1), z_dir=(-0.34202014332566977, 0.939692620785908, 0))):
        with Locations(Location((0, 30, 0), (0, 0, 90))):
            Circle(ESQUISSE35_R)
    extrude(amount=BOSS_EXTRU_11_DEPTH, both=True)


with BuildPart() as part_1:
    add(part.part)

    add(body_2.part)  # Boss.-Extru.12 merges body 2
    # Esquisse40 → Boss.-Extru.12 (add, symmetric)
    with BuildSketch(Plane.XY):
        Polygon((-26.371231461, -15.259769042), (-30.010325786, -5.261439557), (-1.819547162, 4.999164743), (1.819547162, -4.999164743), align=None)
    extrude(amount=BOSS_EXTRU_12_DEPTH, both=True)

    # Esquisse41 → Enlèv. mat.-Extru.7 (cut)
    with BuildSketch(Plane(origin=(-1.819547162, 4.999164743, 0), x_dir=(0.939692620785908, 0.3420201433256698, 0), z_dir=(-0.3420201433256698, 0.9396926207859081, 0))):
        with Locations(Location((-30, 0, 0), (0, 0, 180))):
            Circle(ESQUISSE41_R)
    extrude(amount=-ENL_V_MAT_EXTRU_7_DEPTH, mode=Mode.SUBTRACT)

    # Esquisse42 → Boss.-Extru.13 (add)
    with BuildSketch(Plane.XY.offset(27.64)):
        with BuildLine():
            Line((0.8, 39.91), (0.8, 34.91))
            Line((0.8, 34.91), (12.215, 34.91))
            Line((12.215, 34.91), (12.215, 39.91))
            ThreePointArc((12.215, 39.91), (6.5075, 45.6175), (0.8, 39.91))
        make_face()
        with Locations((6.5075, 39.91)):
            Circle(ESQUISSE42_R, mode=Mode.SUBTRACT)
    extrude(amount=-BOSS_EXTRU_13_DEPTH)

    # Esquisse45 wall → Nervure4 (add, up to next)
    with BuildSketch(Plane(origin=(2.8, 9.999582371, 17.640000004), x_dir=(0, -0.707106781505, -0.707106780868), z_dir=(0, -0.707106780868, 0.707106781505)), mode=Mode.PRIVATE) as nervure4_sk1:
        Rectangle(ESQUISSE45_WALL_W, ESQUISSE45_WALL_H)
    nervure4_tool1 = extrude(nervure4_sk1.sketch, amount=NERVURE4_REACH, mode=Mode.PRIVATE) - part_1.part
    nervure4 = nervure4_tool1.solids().sort_by_distance((2.8, 9.999582371, 17.640000004))[0]
    add(nervure4)

    # Congé1
    cong_1_edges = [part_1.edges().sort_by_distance(p)[0] for p in [
        (54.163207106, 0, 27.64),
        (63.63, 14.955, 27.64),
        (63.63, 0, 21.296081799),
        (63.63, 0, -21.296081799),
        (63.63, 14.955, -27.64),
        (54.163207106, 0, -27.64),
    ]]
    fillet(cong_1_edges, radius=CONG_1_R)

    # Symétrie3: Nervure4 across plane
    add(nervure4.mirror(Plane.XY))

    # Congé2
    cong_2_edges = [part_1.edges().sort_by_distance(p)[0] for p in [
        (63.63, 34.91, 24.64),
        (63.63, 34.91, -24.64),
        (52.215, 5, 25.14),
        (12.215, 5, -25.14),
        (12.215, 29.91, 25.14),
        (52.215, 29.91, 25.14),
        (0.8, 22.455, 27.64),
        (12.215, 5, 25.14),
        (52.215, 29.91, -25.14),
        (12.215, 29.91, -25.14),
        (0.8, 34.91, -25.14),
        (52.215, 5, -25.14),
        (31.715, 34.91, -27.64),
        (37.4225, 34.91, 27.64),
        (6.5075, 45.6175, 27.64),
        (12.215, 34.91, 25.14),
        (12.215, 37.41, 27.64),
        (63.337106781, 34.91, 27.347106781),
        (63.337106781, 34.91, -27.347106781),
    ]]
    fillet(cong_2_edges, radius=CONG_2_R)


solid = part_1.part
